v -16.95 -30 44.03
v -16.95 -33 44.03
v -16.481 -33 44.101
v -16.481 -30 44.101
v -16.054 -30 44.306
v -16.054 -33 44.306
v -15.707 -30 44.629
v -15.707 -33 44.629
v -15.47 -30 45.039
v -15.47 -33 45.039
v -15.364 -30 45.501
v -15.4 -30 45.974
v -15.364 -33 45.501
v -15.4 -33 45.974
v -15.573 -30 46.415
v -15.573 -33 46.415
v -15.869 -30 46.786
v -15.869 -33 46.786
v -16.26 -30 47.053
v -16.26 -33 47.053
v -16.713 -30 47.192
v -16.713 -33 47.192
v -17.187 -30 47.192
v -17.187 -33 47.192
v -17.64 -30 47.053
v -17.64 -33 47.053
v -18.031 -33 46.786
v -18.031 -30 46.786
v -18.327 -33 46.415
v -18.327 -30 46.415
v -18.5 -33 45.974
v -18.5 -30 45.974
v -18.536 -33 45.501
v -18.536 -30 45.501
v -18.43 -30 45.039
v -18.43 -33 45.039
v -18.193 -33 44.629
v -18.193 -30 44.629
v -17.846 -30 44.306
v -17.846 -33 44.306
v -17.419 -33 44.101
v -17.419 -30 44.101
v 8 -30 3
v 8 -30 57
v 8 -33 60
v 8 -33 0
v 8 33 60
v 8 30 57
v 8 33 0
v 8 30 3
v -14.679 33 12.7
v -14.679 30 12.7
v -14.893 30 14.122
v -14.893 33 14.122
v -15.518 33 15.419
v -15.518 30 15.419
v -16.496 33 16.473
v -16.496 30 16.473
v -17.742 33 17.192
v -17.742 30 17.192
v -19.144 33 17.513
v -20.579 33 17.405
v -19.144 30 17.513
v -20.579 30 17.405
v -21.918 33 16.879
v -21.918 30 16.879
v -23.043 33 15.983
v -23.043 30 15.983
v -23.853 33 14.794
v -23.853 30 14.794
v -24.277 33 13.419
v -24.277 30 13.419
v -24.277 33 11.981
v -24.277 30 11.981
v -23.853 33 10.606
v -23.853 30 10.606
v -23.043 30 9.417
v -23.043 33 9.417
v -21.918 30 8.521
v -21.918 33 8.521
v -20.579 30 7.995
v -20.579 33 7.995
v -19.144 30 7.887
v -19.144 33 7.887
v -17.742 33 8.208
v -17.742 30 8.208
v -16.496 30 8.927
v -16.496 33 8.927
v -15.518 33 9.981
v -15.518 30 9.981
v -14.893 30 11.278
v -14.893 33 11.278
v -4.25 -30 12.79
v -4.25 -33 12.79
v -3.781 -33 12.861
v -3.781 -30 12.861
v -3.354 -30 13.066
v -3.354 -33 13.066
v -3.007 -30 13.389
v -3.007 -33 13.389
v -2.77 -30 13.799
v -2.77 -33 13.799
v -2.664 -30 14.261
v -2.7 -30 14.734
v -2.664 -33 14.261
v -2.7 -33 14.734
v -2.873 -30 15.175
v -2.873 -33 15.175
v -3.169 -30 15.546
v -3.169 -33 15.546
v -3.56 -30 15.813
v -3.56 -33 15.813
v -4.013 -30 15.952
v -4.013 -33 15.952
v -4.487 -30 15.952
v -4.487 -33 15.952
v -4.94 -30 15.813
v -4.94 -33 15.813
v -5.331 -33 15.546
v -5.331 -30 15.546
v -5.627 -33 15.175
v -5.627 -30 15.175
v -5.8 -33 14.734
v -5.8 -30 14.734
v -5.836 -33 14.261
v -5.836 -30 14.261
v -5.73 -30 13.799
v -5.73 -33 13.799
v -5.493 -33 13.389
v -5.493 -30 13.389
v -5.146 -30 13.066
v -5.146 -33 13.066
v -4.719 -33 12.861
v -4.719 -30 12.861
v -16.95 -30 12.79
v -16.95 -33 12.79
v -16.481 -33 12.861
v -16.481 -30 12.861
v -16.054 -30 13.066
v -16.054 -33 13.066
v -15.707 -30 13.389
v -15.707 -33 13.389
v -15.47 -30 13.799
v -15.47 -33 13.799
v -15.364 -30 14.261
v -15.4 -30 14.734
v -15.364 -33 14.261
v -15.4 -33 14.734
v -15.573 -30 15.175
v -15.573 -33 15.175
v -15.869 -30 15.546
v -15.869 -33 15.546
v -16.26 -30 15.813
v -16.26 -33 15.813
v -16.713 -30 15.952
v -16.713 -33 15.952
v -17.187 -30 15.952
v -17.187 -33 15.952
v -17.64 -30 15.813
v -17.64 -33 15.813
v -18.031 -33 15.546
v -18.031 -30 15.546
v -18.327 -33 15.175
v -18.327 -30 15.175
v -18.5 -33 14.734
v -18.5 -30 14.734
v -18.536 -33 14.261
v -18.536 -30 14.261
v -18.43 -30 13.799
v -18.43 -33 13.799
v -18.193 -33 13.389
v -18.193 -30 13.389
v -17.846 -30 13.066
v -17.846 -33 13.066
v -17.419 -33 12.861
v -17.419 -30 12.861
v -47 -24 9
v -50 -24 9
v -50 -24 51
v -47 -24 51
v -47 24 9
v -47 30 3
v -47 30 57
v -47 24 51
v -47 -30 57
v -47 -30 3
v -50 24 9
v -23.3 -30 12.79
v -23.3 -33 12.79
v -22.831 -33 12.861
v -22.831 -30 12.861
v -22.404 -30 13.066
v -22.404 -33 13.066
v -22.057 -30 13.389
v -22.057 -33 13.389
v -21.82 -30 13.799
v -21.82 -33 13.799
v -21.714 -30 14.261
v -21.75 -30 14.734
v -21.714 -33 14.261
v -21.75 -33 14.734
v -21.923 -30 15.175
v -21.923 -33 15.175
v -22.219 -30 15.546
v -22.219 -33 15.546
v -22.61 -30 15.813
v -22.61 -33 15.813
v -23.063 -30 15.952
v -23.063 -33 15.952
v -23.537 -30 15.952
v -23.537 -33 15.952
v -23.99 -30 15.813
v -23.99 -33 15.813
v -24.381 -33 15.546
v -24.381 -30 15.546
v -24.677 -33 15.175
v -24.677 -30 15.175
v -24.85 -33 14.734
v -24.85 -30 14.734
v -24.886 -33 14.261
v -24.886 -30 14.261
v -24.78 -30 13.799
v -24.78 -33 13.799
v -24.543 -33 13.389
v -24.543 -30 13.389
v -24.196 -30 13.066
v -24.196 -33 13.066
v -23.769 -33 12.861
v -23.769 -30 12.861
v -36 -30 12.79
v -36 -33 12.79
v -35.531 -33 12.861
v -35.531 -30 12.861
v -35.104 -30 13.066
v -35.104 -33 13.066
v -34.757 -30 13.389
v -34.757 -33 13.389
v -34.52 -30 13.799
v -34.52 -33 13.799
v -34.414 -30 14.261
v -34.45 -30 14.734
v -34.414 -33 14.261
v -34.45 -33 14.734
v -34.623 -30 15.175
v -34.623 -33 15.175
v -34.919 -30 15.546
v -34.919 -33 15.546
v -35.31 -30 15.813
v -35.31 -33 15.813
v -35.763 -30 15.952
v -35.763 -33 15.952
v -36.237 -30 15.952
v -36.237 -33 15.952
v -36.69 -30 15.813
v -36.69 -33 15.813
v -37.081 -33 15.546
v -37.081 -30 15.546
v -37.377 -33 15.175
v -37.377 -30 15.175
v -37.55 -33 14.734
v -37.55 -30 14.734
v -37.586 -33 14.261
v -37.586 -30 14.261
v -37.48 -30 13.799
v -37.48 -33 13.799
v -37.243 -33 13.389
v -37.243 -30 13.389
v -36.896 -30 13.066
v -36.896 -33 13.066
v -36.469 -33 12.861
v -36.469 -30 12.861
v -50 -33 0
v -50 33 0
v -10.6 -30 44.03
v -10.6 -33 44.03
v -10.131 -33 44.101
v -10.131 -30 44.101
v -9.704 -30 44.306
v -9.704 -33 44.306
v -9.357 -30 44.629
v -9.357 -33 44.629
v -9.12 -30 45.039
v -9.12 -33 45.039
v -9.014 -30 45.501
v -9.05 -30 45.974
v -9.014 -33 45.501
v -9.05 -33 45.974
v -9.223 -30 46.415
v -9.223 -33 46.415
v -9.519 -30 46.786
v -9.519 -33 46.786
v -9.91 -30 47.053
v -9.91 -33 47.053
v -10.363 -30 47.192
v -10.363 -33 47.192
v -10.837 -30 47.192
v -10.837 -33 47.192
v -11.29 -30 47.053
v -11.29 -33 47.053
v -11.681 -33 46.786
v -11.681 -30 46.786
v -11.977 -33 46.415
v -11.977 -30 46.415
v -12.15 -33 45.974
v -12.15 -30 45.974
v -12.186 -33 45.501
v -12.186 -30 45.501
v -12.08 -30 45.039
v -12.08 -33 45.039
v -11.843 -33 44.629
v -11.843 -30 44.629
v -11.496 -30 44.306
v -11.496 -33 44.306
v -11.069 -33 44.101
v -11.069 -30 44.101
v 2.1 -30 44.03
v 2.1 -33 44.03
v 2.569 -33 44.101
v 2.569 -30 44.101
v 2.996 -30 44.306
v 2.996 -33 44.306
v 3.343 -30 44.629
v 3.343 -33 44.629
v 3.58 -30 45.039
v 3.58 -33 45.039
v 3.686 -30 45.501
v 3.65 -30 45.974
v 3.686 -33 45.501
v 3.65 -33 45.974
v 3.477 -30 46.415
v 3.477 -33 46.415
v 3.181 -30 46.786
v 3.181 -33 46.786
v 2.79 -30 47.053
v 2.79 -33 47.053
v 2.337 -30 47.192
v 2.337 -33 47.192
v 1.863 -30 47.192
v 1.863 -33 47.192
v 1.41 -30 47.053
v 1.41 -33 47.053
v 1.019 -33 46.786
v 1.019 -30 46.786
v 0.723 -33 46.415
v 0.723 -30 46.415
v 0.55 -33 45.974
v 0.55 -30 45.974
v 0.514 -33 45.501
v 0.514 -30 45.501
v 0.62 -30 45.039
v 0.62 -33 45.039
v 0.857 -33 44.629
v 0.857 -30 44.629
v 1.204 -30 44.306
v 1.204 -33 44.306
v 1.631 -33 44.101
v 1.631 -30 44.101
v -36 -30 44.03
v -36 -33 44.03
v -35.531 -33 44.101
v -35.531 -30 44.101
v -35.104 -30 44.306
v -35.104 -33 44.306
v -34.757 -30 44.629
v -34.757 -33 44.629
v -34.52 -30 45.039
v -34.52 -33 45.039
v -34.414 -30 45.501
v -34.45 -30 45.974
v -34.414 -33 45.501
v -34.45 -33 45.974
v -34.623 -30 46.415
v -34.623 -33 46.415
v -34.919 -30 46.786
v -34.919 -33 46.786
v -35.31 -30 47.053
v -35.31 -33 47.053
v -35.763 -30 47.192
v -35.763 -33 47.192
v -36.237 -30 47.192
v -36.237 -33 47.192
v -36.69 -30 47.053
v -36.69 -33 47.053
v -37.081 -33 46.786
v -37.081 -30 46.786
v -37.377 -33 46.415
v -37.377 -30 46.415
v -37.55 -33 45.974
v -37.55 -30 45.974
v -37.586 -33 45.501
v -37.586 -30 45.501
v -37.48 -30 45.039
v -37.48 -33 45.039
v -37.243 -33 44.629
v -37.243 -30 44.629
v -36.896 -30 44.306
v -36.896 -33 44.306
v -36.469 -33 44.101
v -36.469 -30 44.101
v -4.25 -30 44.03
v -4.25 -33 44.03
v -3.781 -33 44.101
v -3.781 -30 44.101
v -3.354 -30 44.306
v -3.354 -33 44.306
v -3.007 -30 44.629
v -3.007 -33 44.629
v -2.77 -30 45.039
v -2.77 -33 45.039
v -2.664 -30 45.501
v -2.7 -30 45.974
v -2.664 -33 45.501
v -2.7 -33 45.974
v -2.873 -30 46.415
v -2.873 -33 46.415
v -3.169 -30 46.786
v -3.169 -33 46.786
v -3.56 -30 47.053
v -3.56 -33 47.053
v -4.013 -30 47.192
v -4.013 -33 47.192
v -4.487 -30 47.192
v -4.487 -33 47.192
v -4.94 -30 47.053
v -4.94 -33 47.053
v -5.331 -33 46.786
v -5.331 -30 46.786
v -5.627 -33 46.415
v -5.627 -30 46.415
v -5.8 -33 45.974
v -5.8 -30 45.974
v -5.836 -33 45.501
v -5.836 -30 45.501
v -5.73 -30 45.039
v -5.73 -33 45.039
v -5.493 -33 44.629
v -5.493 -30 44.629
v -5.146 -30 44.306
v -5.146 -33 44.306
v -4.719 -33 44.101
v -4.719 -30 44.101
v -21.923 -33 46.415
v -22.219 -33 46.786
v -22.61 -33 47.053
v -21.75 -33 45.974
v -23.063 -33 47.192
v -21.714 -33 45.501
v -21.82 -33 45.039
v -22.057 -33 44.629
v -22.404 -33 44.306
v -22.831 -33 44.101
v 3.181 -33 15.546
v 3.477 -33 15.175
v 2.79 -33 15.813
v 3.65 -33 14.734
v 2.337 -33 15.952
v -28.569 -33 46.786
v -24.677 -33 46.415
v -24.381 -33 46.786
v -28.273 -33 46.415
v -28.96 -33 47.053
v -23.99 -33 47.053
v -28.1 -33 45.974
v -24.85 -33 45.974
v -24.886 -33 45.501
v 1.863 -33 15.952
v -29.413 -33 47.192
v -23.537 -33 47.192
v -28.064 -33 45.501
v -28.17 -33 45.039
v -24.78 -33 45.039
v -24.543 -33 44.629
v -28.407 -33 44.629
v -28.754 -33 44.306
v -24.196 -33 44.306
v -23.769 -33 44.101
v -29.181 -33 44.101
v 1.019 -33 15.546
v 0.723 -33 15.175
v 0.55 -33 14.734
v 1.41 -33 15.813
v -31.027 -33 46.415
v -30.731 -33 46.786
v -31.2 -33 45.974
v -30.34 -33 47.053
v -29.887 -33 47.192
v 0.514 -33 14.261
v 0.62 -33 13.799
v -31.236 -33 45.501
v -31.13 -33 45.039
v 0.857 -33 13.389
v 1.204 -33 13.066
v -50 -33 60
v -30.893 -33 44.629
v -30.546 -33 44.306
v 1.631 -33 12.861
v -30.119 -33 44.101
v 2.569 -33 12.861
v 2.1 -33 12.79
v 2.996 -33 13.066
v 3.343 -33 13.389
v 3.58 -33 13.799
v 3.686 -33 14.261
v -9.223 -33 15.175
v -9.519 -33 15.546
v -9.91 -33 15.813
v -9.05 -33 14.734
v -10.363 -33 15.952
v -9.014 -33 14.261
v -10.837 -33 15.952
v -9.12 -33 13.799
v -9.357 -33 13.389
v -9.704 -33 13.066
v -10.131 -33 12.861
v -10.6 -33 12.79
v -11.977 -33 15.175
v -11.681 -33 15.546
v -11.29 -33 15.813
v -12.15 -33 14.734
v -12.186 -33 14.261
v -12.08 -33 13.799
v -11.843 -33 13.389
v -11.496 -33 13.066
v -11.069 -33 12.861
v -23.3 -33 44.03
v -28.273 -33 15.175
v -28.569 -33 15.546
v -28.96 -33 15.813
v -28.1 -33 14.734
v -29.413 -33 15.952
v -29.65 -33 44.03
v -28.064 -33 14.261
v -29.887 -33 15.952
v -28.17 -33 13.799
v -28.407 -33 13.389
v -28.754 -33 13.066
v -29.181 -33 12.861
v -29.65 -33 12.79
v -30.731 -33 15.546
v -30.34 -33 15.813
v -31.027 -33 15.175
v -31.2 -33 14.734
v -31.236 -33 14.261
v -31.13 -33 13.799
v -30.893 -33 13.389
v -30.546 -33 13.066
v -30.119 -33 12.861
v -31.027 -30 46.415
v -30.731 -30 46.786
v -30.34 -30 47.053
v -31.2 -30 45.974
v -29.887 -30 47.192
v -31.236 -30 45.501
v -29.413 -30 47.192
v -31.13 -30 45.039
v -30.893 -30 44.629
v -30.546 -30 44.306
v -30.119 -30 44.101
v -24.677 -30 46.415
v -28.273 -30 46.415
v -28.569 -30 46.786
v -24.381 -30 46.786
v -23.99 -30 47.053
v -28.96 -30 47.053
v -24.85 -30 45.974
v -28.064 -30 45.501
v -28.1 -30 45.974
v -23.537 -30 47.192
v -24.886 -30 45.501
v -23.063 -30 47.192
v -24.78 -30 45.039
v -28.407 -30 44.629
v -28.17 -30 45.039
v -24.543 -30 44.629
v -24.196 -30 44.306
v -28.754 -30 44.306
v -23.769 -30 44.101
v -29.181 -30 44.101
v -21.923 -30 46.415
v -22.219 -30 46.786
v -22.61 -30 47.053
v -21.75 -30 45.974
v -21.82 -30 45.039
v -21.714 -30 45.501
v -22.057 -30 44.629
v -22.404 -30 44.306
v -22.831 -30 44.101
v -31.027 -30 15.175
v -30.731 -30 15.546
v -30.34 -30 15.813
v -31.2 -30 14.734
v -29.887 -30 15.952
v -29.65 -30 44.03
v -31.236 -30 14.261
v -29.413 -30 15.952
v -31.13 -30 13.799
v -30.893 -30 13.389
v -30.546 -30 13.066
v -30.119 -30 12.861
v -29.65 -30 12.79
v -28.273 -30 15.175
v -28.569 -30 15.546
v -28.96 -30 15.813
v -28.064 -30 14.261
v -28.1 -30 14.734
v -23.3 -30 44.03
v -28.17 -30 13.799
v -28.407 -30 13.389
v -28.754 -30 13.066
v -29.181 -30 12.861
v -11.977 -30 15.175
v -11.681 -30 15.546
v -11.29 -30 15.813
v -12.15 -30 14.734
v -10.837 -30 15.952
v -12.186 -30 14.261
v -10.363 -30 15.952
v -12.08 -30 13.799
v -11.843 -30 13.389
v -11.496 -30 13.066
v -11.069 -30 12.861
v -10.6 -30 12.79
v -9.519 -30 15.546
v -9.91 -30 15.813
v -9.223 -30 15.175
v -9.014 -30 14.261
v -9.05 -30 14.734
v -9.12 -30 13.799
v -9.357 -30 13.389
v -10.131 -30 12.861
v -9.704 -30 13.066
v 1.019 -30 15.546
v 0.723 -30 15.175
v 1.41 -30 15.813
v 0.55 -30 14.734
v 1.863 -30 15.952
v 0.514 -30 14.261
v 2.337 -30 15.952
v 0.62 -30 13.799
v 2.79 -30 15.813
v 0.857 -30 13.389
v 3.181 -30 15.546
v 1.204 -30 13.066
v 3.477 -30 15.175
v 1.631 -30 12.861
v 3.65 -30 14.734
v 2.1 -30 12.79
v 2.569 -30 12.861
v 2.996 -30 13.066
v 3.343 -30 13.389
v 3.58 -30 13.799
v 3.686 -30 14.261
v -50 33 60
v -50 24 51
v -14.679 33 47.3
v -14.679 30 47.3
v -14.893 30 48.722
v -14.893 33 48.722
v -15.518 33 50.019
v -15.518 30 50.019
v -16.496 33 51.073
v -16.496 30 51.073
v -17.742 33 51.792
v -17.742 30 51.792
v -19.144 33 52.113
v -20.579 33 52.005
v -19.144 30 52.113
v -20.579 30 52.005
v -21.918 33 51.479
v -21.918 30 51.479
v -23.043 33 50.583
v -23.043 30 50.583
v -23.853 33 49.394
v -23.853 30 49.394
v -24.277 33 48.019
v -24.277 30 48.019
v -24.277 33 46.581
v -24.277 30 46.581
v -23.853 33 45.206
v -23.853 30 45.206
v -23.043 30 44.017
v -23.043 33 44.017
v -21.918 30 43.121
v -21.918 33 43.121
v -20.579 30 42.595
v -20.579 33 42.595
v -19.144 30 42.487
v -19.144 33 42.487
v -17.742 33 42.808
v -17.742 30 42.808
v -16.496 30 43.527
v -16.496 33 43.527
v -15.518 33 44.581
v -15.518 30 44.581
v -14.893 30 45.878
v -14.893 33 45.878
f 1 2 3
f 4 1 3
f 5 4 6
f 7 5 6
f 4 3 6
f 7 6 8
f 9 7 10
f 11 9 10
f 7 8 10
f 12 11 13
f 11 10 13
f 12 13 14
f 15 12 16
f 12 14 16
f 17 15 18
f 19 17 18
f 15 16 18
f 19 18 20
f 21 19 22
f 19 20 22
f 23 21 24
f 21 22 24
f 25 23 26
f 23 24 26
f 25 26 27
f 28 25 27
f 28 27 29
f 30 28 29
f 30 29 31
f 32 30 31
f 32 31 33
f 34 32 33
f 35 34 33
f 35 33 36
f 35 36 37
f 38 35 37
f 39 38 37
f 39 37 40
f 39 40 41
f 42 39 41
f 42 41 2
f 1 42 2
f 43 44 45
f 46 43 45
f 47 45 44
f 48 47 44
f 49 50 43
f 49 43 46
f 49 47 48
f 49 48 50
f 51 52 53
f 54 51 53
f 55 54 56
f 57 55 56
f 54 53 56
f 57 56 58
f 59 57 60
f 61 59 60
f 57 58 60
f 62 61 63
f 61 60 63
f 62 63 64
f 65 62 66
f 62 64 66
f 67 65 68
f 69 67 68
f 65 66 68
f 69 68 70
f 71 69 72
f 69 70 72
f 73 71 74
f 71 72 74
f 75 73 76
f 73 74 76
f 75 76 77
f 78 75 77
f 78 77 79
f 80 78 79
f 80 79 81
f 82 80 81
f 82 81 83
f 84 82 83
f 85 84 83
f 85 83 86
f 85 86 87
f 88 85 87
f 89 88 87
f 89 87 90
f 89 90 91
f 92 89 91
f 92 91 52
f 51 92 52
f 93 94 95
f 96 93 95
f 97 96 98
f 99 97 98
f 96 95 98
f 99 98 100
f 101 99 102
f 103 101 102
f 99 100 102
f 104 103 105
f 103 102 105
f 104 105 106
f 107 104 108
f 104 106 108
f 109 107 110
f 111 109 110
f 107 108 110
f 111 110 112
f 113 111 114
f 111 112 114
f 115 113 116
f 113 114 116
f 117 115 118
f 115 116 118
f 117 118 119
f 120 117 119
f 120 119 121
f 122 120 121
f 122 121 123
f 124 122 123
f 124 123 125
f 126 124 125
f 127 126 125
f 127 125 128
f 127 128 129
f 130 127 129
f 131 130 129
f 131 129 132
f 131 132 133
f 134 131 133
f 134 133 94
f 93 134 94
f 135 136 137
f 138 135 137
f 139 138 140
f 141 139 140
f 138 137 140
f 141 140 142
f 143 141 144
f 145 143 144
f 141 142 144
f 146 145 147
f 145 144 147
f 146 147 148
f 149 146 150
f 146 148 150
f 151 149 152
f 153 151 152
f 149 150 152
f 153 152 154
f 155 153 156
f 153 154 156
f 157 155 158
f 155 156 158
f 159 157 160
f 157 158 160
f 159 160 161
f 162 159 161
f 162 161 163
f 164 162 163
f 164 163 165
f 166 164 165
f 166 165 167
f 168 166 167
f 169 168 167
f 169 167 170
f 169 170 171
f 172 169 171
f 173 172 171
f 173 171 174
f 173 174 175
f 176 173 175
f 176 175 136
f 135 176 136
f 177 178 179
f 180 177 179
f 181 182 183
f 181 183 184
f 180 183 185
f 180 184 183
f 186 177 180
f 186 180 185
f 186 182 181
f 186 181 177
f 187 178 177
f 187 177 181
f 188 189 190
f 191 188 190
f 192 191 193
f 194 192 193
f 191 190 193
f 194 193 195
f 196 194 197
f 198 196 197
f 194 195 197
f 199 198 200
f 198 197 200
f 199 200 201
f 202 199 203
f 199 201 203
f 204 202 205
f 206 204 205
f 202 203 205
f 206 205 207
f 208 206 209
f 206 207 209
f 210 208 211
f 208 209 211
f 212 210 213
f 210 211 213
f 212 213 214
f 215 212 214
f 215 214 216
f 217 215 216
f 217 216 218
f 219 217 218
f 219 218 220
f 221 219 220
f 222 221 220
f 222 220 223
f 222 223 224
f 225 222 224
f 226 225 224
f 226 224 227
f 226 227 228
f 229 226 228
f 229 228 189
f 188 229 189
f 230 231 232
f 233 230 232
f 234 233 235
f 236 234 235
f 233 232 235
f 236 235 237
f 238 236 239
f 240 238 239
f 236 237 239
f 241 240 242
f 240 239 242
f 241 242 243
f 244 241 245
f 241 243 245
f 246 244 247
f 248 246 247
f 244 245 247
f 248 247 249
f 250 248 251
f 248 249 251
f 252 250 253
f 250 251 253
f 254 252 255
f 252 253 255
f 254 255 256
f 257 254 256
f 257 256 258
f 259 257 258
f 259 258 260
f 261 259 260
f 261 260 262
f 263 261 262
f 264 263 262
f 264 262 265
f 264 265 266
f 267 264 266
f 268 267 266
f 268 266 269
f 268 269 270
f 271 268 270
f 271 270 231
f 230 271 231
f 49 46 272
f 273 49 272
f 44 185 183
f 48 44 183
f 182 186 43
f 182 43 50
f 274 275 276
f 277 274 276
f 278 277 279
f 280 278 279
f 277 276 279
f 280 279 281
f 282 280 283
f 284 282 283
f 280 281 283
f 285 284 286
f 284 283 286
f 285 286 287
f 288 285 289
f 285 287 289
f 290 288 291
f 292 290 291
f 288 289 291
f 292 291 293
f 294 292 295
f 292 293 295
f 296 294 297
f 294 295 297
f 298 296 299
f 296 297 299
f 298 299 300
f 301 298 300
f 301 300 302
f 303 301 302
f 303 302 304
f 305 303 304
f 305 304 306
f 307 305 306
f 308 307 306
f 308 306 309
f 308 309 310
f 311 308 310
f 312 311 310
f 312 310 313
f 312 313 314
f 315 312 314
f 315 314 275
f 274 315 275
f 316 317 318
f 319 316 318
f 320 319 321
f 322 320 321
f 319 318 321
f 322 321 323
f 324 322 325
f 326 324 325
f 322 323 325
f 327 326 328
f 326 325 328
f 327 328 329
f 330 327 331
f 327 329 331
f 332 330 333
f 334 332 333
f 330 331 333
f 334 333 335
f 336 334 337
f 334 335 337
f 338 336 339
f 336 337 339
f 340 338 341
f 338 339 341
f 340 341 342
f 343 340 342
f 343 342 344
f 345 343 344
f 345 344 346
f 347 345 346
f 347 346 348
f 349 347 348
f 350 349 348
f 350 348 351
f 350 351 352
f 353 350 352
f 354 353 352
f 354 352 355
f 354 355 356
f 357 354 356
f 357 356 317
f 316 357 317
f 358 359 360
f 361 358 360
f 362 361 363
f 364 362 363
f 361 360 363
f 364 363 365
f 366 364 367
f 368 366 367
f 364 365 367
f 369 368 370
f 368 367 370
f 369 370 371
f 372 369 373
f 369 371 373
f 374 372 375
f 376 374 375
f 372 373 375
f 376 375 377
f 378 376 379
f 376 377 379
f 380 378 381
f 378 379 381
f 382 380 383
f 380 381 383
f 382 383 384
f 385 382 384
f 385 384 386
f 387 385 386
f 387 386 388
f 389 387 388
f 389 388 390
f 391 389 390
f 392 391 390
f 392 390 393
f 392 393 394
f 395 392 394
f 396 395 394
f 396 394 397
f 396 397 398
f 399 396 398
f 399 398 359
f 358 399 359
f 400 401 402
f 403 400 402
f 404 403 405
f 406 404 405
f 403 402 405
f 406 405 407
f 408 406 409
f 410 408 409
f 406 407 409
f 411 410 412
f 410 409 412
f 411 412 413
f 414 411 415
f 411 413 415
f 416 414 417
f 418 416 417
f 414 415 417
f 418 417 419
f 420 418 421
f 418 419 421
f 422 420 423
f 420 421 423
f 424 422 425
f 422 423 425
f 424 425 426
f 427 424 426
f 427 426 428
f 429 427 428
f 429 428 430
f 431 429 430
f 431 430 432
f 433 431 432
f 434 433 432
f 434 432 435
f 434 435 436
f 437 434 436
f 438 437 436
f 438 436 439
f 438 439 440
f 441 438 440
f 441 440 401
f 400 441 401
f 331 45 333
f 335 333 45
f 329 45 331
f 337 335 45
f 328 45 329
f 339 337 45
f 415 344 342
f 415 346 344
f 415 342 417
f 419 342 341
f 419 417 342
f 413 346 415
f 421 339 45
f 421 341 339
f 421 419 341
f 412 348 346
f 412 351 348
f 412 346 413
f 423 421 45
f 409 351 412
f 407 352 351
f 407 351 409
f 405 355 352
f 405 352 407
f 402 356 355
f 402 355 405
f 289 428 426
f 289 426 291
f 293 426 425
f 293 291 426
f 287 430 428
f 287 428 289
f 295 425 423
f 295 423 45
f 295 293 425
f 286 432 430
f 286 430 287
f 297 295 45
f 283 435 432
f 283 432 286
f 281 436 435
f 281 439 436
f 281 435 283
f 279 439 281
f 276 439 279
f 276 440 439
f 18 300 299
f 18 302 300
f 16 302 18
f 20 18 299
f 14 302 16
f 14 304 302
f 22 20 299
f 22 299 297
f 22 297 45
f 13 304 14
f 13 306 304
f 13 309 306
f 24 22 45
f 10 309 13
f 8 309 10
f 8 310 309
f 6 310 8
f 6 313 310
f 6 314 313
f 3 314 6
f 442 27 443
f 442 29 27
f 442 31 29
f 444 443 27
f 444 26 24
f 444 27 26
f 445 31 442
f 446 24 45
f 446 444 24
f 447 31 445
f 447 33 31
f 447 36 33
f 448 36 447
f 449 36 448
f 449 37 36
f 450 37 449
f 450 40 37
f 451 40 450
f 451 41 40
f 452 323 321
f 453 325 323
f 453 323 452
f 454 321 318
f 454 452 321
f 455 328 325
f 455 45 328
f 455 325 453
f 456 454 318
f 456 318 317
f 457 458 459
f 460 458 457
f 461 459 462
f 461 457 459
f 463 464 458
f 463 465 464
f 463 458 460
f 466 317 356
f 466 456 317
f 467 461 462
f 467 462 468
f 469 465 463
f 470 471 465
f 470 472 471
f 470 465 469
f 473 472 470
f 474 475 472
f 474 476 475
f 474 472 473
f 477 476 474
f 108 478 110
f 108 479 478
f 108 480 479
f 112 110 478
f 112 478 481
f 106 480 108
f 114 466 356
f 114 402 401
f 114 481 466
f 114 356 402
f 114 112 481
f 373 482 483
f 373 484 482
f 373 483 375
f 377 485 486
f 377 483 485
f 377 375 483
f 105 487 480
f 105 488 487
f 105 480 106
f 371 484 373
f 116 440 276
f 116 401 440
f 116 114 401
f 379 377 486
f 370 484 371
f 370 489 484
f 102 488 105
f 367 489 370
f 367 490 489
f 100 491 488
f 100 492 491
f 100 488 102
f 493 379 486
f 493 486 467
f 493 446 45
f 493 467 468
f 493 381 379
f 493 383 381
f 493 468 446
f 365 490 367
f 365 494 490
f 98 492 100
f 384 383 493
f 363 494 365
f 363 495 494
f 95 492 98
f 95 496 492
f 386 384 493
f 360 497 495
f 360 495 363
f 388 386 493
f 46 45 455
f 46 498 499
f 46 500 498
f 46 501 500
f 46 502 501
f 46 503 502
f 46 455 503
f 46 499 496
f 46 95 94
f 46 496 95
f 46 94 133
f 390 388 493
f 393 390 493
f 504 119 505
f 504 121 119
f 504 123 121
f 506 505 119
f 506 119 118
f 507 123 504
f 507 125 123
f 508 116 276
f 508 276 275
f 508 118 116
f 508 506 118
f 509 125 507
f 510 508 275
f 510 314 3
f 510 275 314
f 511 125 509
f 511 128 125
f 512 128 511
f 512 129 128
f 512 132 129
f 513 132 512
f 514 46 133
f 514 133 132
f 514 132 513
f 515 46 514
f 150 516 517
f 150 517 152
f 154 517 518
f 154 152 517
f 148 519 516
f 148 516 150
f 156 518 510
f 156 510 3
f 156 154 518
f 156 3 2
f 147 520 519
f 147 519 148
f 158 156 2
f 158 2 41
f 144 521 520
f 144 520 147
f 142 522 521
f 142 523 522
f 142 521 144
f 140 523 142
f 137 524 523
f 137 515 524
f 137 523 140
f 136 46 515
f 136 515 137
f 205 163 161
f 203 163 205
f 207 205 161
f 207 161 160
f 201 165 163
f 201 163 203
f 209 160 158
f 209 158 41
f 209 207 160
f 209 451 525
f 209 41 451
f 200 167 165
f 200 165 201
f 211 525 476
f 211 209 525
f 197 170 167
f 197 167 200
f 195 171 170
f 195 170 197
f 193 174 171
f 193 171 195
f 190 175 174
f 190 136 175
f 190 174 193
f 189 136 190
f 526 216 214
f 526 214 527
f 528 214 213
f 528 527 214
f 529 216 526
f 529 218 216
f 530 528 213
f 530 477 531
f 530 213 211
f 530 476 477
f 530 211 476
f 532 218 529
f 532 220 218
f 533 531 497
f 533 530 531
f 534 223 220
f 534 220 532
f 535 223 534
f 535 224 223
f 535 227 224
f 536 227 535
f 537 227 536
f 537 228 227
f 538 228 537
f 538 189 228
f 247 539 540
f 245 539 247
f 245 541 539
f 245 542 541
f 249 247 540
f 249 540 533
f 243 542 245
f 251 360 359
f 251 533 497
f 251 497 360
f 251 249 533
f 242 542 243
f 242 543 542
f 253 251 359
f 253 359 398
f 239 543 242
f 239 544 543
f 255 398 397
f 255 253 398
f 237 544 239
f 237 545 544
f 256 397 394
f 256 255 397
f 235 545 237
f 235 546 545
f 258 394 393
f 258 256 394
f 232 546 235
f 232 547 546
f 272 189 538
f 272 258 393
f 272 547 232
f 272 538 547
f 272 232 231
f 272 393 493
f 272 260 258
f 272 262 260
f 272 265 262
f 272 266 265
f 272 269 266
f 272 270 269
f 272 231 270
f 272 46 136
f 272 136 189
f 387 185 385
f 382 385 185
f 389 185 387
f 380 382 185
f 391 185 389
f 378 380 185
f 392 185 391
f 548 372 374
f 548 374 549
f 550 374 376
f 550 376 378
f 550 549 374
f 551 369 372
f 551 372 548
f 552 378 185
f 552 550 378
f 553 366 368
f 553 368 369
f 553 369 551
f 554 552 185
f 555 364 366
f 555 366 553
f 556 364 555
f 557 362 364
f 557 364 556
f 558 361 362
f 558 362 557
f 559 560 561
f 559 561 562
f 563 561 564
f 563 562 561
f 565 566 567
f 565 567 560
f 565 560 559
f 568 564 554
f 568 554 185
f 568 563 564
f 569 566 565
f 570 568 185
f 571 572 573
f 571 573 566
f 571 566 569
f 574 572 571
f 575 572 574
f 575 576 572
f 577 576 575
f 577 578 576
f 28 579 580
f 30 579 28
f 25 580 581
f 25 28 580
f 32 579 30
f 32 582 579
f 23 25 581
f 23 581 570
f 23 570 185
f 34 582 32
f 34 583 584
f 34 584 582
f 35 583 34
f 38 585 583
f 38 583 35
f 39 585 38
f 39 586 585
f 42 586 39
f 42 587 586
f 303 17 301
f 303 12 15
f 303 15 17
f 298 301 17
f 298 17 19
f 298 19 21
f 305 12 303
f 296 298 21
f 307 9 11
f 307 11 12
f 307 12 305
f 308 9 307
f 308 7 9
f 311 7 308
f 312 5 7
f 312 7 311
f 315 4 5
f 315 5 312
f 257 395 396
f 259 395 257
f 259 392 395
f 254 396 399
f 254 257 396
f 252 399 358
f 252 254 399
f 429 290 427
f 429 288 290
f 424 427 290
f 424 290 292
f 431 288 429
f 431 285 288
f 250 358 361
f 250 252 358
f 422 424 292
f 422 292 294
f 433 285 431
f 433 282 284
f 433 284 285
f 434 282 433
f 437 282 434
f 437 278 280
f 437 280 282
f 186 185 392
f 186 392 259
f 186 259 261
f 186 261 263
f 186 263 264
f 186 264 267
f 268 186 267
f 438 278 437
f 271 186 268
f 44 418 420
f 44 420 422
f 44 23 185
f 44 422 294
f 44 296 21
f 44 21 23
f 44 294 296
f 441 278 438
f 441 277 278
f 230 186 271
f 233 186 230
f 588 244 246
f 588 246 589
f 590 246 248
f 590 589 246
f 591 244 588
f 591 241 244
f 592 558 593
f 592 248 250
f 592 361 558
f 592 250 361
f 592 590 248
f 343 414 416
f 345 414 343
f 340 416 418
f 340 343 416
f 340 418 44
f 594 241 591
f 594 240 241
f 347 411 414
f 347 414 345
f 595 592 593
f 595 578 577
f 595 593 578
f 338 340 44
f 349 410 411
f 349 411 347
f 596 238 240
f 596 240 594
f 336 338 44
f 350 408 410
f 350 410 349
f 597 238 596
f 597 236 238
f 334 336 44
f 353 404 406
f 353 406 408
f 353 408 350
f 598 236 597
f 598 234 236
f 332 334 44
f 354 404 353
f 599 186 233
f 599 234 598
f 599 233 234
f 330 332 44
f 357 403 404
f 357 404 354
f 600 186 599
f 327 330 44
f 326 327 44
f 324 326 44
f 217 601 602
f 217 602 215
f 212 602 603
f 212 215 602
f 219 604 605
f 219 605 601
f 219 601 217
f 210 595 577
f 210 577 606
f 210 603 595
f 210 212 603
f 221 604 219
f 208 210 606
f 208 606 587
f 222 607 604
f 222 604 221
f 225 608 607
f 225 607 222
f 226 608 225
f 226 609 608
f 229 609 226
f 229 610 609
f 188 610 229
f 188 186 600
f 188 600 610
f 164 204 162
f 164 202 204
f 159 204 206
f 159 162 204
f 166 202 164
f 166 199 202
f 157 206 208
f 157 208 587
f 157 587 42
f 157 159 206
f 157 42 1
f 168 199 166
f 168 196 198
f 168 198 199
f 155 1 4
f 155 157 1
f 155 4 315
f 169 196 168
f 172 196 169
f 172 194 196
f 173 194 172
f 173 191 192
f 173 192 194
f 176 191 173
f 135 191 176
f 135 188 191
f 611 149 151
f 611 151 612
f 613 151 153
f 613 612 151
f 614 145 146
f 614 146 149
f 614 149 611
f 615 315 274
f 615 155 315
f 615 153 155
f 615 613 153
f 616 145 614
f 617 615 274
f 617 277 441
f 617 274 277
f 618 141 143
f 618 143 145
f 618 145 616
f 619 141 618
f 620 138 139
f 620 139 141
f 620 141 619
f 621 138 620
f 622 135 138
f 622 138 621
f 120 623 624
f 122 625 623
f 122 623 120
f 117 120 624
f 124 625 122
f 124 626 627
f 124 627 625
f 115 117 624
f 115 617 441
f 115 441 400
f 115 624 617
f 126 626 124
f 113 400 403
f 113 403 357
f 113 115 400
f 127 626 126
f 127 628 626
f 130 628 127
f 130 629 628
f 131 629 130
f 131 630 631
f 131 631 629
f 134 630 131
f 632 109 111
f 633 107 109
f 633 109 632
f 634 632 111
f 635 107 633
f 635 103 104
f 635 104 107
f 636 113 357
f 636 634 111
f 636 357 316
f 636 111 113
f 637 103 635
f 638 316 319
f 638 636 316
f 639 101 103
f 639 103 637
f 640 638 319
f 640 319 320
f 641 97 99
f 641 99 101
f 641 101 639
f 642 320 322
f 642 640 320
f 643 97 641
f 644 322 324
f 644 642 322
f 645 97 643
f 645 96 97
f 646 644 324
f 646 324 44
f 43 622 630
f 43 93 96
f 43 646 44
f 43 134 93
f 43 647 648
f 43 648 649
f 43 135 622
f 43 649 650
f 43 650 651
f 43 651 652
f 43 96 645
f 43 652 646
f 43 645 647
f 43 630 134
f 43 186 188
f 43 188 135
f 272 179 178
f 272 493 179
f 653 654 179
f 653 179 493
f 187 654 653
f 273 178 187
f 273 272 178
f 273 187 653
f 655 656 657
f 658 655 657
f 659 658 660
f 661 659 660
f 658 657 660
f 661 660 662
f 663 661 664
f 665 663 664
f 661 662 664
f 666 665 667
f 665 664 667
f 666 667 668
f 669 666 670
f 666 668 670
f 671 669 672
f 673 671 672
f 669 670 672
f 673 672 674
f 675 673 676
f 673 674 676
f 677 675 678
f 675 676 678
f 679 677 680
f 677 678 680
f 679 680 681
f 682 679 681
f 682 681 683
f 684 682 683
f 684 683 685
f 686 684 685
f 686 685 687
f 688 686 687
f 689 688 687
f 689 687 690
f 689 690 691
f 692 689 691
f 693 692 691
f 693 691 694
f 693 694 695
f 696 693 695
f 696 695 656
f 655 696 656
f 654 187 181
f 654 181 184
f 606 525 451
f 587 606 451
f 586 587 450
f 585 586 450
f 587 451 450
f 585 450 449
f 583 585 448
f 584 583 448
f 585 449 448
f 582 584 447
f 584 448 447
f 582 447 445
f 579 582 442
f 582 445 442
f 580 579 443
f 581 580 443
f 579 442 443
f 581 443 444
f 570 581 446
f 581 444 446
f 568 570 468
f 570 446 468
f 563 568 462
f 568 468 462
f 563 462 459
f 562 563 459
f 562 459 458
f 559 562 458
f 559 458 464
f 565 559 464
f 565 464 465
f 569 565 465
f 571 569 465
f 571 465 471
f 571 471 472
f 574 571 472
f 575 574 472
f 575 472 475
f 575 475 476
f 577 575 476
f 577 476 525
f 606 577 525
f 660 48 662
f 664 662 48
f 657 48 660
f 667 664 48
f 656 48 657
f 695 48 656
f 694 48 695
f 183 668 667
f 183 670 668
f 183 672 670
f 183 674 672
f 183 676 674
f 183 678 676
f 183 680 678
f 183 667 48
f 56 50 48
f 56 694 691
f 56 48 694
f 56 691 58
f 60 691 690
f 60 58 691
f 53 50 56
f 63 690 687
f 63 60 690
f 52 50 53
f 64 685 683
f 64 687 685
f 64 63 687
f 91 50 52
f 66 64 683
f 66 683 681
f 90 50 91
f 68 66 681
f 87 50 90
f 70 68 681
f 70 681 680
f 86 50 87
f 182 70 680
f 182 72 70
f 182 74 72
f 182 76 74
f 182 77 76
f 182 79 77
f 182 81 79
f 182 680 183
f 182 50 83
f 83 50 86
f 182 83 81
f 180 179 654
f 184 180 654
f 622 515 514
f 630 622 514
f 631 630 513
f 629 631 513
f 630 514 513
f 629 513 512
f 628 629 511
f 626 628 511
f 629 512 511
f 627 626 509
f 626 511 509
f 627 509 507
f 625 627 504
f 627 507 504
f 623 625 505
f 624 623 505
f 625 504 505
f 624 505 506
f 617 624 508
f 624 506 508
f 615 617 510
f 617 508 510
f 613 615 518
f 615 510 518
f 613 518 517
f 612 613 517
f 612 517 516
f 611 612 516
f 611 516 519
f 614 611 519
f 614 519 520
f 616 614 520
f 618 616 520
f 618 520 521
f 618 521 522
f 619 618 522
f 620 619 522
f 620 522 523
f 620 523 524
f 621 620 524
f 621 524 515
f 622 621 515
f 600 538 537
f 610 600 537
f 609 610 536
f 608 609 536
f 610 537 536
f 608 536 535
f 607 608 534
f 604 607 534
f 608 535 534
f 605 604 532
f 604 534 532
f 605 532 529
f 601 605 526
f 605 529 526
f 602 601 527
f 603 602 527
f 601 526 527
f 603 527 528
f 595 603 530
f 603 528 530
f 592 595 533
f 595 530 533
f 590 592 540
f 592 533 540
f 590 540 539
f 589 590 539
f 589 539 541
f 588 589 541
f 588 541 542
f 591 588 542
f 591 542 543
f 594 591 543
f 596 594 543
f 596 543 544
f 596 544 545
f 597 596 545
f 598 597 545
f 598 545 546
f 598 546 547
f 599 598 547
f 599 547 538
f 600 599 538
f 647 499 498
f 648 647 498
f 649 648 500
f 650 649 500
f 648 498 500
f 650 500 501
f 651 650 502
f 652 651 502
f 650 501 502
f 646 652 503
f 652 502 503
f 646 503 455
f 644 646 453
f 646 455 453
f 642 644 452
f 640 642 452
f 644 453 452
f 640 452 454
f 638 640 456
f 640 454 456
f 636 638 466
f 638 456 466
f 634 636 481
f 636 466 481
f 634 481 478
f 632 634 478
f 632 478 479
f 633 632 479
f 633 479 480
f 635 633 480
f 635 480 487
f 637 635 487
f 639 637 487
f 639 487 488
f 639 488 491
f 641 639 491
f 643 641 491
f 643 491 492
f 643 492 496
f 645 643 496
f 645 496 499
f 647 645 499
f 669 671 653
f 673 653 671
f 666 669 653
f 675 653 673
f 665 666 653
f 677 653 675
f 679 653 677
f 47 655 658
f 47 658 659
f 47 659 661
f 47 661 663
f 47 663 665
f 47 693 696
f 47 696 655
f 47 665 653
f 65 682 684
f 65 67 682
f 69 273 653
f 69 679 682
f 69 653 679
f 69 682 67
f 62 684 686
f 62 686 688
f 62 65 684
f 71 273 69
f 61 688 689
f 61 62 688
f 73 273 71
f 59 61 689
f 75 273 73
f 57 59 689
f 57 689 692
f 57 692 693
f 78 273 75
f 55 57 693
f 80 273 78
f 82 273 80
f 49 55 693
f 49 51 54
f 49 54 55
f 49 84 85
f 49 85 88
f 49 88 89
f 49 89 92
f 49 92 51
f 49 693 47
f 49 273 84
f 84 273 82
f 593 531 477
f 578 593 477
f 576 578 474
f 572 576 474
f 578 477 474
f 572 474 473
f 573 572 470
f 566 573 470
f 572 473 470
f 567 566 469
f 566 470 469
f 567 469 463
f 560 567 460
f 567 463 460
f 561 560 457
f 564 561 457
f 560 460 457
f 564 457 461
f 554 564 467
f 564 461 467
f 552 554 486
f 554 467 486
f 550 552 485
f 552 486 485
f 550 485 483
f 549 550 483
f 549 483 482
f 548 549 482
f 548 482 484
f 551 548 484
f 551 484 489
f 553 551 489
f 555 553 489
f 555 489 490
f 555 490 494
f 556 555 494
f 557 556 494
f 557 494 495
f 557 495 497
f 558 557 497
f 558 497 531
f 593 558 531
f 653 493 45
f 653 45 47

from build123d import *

# Parameters (mm, degrees)
BOSS_EXTRUDE1_DEPTH = 60
CUT_EXTRUDE1_REACH  = 104.255
SKETCH2_R           = 1.59
SKETCH3_W           = 42
SKETCH3_H           = 48
CUT_EXTRUDE2_DEPTH  = 60
SKETCH6_W           = 3
SKETCH6_H           = 60
BOSS_EXTRUDE2_DEPTH = 55
SKETCH4_R           = 4.826
CUT_EXTRUDE3_DEPTH  = 109.474


with BuildPart() as part:
    # Sketch1 → Boss-Extrude1 (new body)
    with BuildSketch(Plane.XY):
        Polygon((8, 30), (-47, 30), (-47, -30), (8, -30), (8, -33), (-50, -33), (-50, 33), (8, 33), align=None)
    extrude(amount=BOSS_EXTRUDE1_DEPTH)

    # Sketch2 → Cut-Extrude1 (cut, up to next)
    with BuildSketch(Plane.XZ.offset(33), mode=Mode.PRIVATE) as cut_extrude1_sk1:
        with Locations(Location((-36, 45.62, 0), (0, 0, 270))):
            Circle(SKETCH2_R)
    cut_extrude1_tool1 = extrude(cut_extrude1_sk1.sketch, amount=-CUT_EXTRUDE1_REACH, mode=Mode.PRIVATE) & part.part
    # Sketch2 → Cut-Extrude1 (cut, up to next)
    with BuildSketch(Plane.XZ.offset(33), mode=Mode.PRIVATE) as cut_extrude1_sk2:
        with Locations(Location((-29.65, 45.62, 0), (0, 0, 270))):
            Circle(SKETCH2_R)
    cut_extrude1_tool2 = extrude(cut_extrude1_sk2.sketch, amount=-CUT_EXTRUDE1_REACH, mode=Mode.PRIVATE) & part.part
    # Sketch2 → Cut-Extrude1 (cut, up to next)
    with BuildSketch(Plane.XZ.offset(33), mode=Mode.PRIVATE) as cut_extrude1_sk3:
        with Locations(Location((-23.3, 45.62, 0), (0, 0, 270))):
            Circle(SKETCH2_R)
    cut_extrude1_tool3 = extrude(cut_extrude1_sk3.sketch, amount=-CUT_EXTRUDE1_REACH, mode=Mode.PRIVATE) & part.part
    # Sketch2 → Cut-Extrude1 (cut, up to next)
    with BuildSketch(Plane.XZ.offset(33), mode=Mode.PRIVATE) as cut_extrude1_sk4:
        with Locations(Location((-16.95, 45.62, 0), (0, 0, 270))):
            Circle(SKETCH2_R)
    cut_extrude1_tool4 = extrude(cut_extrude1_sk4.sketch, amount=-CUT_EXTRUDE1_REACH, mode=Mode.PRIVATE) & part.part
    # Sketch2 → Cut-Extrude1 (cut, up to next)
    with BuildSketch(Plane.XZ.offset(33), mode=Mode.PRIVATE) as cut_extrude1_sk5:
        with Locations(Location((-10.6, 45.62, 0), (0, 0, 270))):
            Circle(SKETCH2_R)
    cut_extrude1_tool5 = extrude(cut_extrude1_sk5.sketch, amount=-CUT_EXTRUDE1_REACH, mode=Mode.PRIVATE) & part.part
    # Sketch2 → Cut-Extrude1 (cut, up to next)
    with BuildSketch(Plane.XZ.offset(33), mode=Mode.PRIVATE) as cut_extrude1_sk6:
        with Locations(Location((-4.25, 45.62, 0), (0, 0, 270))):
            Circle(SKETCH2_R)
    cut_extrude1_tool6 = extrude(cut_extrude1_sk6.sketch, amount=-CUT_EXTRUDE1_REACH, mode=Mode.PRIVATE) & part.part
    # Sketch2 → Cut-Extrude1 (cut, up to next)
    with BuildSketch(Plane.XZ.offset(33), mode=Mode.PRIVATE) as cut_extrude1_sk7:
        with Locations(Location((2.1, 45.62, 0), (0, 0, 270))):
            Circle(SKETCH2_R)
    cut_extrude1_tool7 = extrude(cut_extrude1_sk7.sketch, amount=-CUT_EXTRUDE1_REACH, mode=Mode.PRIVATE) & part.part
    # Sketch2 → Cut-Extrude1 (cut, up to next)
    with BuildSketch(Plane.XZ.offset(33), mode=Mode.PRIVATE) as cut_extrude1_sk8:
        with Locations(Location((-29.65, 14.38, 0), (0, 0, 270))):
            Circle(SKETCH2_R)
    cut_extrude1_tool8 = extrude(cut_extrude1_sk8.sketch, amount=-CUT_EXTRUDE1_REACH, mode=Mode.PRIVATE) & part.part
    # Sketch2 → Cut-Extrude1 (cut, up to next)
    with BuildSketch(Plane.XZ.offset(33), mode=Mode.PRIVATE) as cut_extrude1_sk9:
        with Locations(Location((-23.3, 14.38, 0), (0, 0, 270))):
            Circle(SKETCH2_R)
    cut_extrude1_tool9 = extrude(cut_extrude1_sk9.sketch, amount=-CUT_EXTRUDE1_REACH, mode=Mode.PRIVATE) & part.part
    # Sketch2 → Cut-Extrude1 (cut, up to next)
    with BuildSketch(Plane.XZ.offset(33), mode=Mode.PRIVATE) as cut_extrude1_sk10:
        with Locations(Location((-16.95, 14.38, 0), (0, 0, 270))):
            Circle(SKETCH2_R)
    cut_extrude1_tool10 = extrude(cut_extrude1_sk10.sketch, amount=-CUT_EXTRUDE1_REACH, mode=Mode.PRIVATE) & part.part
    # Sketch2 → Cut-Extrude1 (cut, up to next)
    with BuildSketch(Plane.XZ.offset(33), mode=Mode.PRIVATE) as cut_extrude1_sk11:
        with Locations(Location((-10.6, 14.38, 0), (0, 0, 270))):
            Circle(SKETCH2_R)
    cut_extrude1_tool11 = extrude(cut_extrude1_sk11.sketch, amount=-CUT_EXTRUDE1_REACH, mode=Mode.PRIVATE) & part.part
    # Sketch2 → Cut-Extrude1 (cut, up to next)
    with BuildSketch(Plane.XZ.offset(33), mode=Mode.PRIVATE) as cut_extrude1_sk12:
        with Locations(Location((-4.25, 14.38, 0), (0, 0, 270))):
            Circle(SKETCH2_R)
    cut_extrude1_tool12 = extrude(cut_extrude1_sk12.sketch, amount=-CUT_EXTRUDE1_REACH, mode=Mode.PRIVATE) & part.part
    # Sketch2 → Cut-Extrude1 (cut, up to next)
    with BuildSketch(Plane.XZ.offset(33), mode=Mode.PRIVATE) as cut_extrude1_sk13:
        with Locations(Location((2.1, 14.38, 0), (0, 0, 270))):
            Circle(SKETCH2_R)
    cut_extrude1_tool13 = extrude(cut_extrude1_sk13.sketch, amount=-CUT_EXTRUDE1_REACH, mode=Mode.PRIVATE) & part.part
    # Sketch2 → Cut-Extrude1 (cut, up to next)
    with BuildSketch(Plane.XZ.offset(33), mode=Mode.PRIVATE) as cut_extrude1_sk14:
        with Locations(Location((-36, 14.38, 0), (0, 0, 270))):
            Circle(SKETCH2_R)
    cut_extrude1_tool14 = extrude(cut_extrude1_sk14.sketch, amount=-CUT_EXTRUDE1_REACH, mode=Mode.PRIVATE) & part.part
    add(cut_extrude1_tool1.solids().sort_by_distance((-36, -33, 45.62))[0], mode=Mode.SUBTRACT)
    add(cut_extrude1_tool2.solids().sort_by_distance((-29.65, -33, 45.62))[0], mode=Mode.SUBTRACT)
    add(cut_extrude1_tool3.solids().sort_by_distance((-23.3, -33, 45.62))[0], mode=Mode.SUBTRACT)
    add(cut_extrude1_tool4.solids().sort_by_distance((-16.95, -33, 45.62))[0], mode=Mode.SUBTRACT)
    add(cut_extrude1_tool5.solids().sort_by_distance((-10.6, -33, 45.62))[0], mode=Mode.SUBTRACT)
    add(cut_extrude1_tool6.solids().sort_by_distance((-4.25, -33, 45.62))[0], mode=Mode.SUBTRACT)
    add(cut_extrude1_tool7.solids().sort_by_distance((2.1, -33, 45.62))[0], mode=Mode.SUBTRACT)
    add(cut_extrude1_tool8.solids().sort_by_distance((-29.65, -33, 14.38))[0], mode=Mode.SUBTRACT)
    add(cut_extrude1_tool9.solids().sort_by_distance((-23.3, -33, 14.38))[0], mode=Mode.SUBTRACT)
    add(cut_extrude1_tool10.solids().sort_by_distance((-16.95, -33, 14.38))[0], mode=Mode.SUBTRACT)
    add(cut_extrude1_tool11.solids().sort_by_distance((-10.6, -33, 14.38))[0], mode=Mode.SUBTRACT)
    add(cut_extrude1_tool12.solids().sort_by_distance((-4.25, -33, 14.38))[0], mode=Mode.SUBTRACT)
    add(cut_extrude1_tool13.solids().sort_by_distance((2.1, -33, 14.38))[0], mode=Mode.SUBTRACT)
    add(cut_extrude1_tool14.solids().sort_by_distance((-36, -33, 14.38))[0], mode=Mode.SUBTRACT)

    # Sketch3 → Cut-Extrude2 (cut)
    with BuildSketch(Plane.ZY.offset(50)):
        with Locations((30, 0)):
            Rectangle(SKETCH3_W, SKETCH3_H)
    extrude(amount=-CUT_EXTRUDE2_DEPTH, mode=Mode.SUBTRACT)

    # Sketch6 → Boss-Extrude2 (add)
    with BuildSketch(Plane(origin=(-47, 0, 0), x_dir=(0, 0, -1), z_dir=(1, 0, 0))):
        with Locations((-58.5, 0)):
            Rectangle(SKETCH6_W, SKETCH6_H)
        with Locations((-1.5, 0)):
            Rectangle(SKETCH6_W, SKETCH6_H)
    extrude(amount=BOSS_EXTRUDE2_DEPTH)

    # Sketch4 → Cut-Extrude3 (cut)
    with BuildSketch(Plane(origin=(-21.609229067, 30, -179.024422281), x_dir=(1, 0, 0), z_dir=(0, -1, 0))):
        with Locations((2.104243746, 226.324422281)):
            Circle(SKETCH4_R)
        with Locations((2.104243746, 191.724422281)):
            Circle(SKETCH4_R)
    extrude(amount=-CUT_EXTRUDE3_DEPTH, mode=Mode.SUBTRACT)


solid = part.part
